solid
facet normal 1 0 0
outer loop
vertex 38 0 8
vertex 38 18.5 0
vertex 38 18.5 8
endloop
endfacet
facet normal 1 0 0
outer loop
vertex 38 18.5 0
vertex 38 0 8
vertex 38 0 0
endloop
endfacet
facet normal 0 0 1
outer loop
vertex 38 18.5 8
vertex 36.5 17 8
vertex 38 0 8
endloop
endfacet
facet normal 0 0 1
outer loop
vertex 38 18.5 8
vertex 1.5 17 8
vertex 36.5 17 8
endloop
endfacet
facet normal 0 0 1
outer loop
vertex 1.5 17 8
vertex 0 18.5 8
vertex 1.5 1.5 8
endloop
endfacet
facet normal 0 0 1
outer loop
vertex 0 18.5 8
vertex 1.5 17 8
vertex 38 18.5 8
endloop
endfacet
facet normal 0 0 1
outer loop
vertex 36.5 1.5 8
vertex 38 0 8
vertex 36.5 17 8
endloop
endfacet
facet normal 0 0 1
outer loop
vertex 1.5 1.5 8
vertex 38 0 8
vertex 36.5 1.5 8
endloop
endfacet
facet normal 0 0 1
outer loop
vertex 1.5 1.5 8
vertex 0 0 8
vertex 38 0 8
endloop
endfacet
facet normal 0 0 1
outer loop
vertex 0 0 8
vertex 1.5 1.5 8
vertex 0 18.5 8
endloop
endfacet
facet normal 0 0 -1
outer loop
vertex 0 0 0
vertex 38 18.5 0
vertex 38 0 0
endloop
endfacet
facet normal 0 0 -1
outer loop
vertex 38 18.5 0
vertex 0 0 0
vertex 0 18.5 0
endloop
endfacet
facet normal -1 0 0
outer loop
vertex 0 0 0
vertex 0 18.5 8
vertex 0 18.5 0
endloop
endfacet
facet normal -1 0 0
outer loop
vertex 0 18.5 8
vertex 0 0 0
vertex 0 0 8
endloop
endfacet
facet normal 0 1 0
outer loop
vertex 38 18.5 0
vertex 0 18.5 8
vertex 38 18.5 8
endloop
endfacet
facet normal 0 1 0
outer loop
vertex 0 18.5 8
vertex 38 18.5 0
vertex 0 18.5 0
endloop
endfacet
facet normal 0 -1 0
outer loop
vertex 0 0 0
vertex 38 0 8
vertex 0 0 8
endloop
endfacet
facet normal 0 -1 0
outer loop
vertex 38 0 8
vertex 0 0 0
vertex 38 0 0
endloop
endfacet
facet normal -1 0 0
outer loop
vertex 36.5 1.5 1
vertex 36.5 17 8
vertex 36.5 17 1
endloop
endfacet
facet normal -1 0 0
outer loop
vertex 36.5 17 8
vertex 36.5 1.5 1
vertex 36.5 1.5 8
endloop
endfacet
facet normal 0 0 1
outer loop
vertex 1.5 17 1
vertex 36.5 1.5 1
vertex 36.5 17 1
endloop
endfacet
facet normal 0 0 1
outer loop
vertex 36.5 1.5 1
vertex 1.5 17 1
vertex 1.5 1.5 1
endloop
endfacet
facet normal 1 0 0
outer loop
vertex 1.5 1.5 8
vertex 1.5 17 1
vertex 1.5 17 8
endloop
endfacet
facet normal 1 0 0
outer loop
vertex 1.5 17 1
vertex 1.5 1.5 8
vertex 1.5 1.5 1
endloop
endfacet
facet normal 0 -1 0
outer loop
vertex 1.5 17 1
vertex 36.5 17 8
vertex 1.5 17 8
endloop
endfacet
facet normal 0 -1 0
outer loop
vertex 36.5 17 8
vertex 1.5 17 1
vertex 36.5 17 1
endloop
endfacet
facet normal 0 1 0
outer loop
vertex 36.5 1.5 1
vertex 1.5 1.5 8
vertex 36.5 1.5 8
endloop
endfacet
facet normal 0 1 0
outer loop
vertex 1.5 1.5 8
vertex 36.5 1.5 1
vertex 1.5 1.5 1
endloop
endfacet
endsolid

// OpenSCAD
 // ==========================
// Tappo USB 14x38 con rientranza | IT/EN: 14x38 USB cover with recess
// ==========================

// Dimensioni esterne | IT/EN: External dimensions
outer_x = 38;   // lunghezza | IT/EN: length
outer_y = 18.5;   // larghezza | IT/EN: width
outer_z = 8;    // spessore totale | IT/EN: total thickness

// Rientranza | IT/EN: Recess
recess_depth = 7;   // profondità rientranza | IT/EN: recess depth
wall = 1.5;         // spessore pareti laterali | IT/EN: side-wall thickness

difference() {

    // Corpo esterno | IT/EN: Outer body
    cube([outer_x, outer_y, outer_z], center = false);

    // Rientranza interna | IT/EN: Internal recess
    translate([wall, wall, outer_z - recess_depth])
        cube([
            outer_x - 2*wall,
            outer_y - 2*wall,
            recess_depth + 0.01
        ], center = false);
}
